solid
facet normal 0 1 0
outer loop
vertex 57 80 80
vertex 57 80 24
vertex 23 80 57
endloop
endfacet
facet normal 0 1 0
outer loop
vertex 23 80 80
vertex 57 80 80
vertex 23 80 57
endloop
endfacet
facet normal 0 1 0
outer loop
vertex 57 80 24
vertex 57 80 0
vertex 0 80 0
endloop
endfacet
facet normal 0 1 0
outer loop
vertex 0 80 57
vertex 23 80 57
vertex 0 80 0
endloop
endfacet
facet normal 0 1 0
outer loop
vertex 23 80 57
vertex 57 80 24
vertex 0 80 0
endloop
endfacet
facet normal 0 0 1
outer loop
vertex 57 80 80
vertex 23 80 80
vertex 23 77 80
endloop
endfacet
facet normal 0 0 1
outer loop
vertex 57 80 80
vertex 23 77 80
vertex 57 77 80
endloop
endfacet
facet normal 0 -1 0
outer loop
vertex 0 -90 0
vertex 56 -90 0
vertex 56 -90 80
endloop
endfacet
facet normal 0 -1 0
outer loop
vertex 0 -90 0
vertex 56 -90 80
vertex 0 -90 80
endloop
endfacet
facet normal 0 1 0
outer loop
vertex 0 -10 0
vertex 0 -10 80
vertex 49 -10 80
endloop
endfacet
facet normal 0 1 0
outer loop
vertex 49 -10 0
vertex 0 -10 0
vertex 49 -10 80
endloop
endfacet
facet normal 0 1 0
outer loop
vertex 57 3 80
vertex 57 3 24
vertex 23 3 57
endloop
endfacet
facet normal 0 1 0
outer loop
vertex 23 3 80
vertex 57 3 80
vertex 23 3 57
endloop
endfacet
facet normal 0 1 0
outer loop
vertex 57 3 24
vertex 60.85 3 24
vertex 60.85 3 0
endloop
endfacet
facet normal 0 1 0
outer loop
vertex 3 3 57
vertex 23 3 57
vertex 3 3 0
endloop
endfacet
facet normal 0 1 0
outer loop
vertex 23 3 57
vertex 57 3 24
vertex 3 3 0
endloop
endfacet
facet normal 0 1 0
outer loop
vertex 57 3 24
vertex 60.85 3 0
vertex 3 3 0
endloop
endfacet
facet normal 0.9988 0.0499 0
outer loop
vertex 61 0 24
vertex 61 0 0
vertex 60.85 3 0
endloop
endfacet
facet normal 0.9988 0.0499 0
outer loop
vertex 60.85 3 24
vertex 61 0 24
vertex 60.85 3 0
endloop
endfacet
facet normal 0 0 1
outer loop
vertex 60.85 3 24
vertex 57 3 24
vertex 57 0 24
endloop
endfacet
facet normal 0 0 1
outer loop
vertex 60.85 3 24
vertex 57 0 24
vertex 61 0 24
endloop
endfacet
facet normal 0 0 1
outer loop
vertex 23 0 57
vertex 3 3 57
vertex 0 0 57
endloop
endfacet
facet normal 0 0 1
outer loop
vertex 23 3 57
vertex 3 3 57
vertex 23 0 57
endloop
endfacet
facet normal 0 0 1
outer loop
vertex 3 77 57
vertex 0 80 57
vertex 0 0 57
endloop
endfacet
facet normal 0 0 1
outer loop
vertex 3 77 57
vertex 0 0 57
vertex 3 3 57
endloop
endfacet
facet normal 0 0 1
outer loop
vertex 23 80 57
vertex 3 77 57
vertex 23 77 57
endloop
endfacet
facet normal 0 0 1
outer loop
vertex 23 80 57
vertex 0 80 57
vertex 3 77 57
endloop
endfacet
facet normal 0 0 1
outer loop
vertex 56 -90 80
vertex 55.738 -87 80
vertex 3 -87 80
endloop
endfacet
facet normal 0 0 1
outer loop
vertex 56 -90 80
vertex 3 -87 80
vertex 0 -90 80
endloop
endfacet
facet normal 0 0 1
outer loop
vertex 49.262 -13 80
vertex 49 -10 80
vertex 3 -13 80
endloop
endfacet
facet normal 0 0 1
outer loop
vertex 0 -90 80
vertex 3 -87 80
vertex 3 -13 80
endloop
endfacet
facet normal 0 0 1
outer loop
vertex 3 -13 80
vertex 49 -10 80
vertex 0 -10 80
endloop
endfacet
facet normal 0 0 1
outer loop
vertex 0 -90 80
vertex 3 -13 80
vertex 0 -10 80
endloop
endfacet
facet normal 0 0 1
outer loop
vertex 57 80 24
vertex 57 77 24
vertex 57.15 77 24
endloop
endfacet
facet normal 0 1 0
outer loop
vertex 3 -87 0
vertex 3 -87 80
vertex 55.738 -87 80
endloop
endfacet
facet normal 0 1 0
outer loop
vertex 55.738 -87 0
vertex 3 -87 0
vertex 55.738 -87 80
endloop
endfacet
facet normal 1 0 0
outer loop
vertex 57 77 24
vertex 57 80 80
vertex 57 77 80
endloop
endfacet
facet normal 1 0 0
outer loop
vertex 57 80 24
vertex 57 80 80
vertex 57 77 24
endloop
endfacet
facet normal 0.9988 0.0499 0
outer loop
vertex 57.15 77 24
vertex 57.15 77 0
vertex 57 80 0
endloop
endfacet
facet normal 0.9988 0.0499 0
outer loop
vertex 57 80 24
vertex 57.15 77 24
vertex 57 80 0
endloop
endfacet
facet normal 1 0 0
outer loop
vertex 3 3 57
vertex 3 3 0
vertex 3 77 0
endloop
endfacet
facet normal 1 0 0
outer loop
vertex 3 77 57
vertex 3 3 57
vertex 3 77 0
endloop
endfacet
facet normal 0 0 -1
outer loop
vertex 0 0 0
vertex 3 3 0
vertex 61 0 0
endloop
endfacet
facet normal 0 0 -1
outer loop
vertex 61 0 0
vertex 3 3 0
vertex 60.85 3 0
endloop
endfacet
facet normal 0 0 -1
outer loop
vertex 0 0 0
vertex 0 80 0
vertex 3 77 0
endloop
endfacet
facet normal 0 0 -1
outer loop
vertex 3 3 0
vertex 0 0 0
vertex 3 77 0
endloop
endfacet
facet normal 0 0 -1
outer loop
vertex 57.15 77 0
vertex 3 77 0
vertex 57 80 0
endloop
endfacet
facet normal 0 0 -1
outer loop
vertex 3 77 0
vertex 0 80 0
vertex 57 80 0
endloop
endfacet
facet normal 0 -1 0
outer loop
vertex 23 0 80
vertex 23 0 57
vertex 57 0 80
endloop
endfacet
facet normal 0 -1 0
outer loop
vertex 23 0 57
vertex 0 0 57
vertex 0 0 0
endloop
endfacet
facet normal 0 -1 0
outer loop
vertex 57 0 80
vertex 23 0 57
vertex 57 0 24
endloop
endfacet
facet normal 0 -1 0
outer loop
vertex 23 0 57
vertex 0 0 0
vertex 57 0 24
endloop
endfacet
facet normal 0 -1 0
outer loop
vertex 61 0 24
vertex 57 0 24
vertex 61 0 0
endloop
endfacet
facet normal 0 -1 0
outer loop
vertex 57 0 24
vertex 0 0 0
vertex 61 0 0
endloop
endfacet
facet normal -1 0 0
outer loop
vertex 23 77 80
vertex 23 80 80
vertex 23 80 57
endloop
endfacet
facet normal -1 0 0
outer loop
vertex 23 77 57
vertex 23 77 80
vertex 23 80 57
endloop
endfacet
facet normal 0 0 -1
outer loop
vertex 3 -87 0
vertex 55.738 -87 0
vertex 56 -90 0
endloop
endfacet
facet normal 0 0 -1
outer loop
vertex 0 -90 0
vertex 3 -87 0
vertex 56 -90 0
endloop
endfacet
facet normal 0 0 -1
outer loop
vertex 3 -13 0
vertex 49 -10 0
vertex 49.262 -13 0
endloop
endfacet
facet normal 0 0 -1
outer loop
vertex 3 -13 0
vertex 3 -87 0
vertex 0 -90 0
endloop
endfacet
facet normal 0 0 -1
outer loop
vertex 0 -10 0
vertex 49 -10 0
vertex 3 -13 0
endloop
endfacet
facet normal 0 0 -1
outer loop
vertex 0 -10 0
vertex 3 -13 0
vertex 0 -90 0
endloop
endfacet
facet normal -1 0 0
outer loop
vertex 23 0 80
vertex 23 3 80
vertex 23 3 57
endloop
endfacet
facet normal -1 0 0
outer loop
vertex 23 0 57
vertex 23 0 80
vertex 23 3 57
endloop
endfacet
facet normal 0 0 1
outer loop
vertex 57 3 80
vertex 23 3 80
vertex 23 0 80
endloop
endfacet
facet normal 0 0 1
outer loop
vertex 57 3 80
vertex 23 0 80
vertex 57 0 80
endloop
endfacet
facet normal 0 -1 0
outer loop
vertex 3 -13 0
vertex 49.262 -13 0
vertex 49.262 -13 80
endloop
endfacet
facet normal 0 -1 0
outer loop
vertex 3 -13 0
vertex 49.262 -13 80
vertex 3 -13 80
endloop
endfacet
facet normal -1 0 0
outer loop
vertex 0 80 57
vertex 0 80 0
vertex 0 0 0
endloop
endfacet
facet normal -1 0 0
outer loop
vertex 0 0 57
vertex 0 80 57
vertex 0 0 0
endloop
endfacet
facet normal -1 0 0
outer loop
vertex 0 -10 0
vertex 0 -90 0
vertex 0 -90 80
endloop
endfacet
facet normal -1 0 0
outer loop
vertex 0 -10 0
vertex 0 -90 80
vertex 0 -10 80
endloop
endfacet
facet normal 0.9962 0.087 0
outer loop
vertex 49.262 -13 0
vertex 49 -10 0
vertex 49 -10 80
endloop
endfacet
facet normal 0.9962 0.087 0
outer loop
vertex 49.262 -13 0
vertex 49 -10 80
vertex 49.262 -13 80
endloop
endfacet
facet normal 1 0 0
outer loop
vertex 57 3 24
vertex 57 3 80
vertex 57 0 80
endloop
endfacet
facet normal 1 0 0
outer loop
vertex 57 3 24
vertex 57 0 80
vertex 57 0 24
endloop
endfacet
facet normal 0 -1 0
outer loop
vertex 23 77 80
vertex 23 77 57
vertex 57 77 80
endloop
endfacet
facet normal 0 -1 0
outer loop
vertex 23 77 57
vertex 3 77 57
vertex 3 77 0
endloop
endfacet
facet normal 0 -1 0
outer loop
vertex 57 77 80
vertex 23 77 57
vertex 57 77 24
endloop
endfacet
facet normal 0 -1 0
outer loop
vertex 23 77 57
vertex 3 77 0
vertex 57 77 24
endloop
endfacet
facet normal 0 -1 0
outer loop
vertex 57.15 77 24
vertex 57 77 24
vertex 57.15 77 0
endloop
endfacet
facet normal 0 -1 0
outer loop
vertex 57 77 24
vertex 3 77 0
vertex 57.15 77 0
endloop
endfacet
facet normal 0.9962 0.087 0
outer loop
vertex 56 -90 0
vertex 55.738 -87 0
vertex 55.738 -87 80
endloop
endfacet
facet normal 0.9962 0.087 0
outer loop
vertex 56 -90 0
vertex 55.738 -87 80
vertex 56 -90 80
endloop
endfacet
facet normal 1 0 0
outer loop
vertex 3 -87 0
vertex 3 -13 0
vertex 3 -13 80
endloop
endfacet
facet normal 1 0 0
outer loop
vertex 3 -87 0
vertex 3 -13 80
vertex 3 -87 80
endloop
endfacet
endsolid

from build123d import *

# Parameters (mm, degrees)
EXTRUDE_1_DEPTH     = 80
EXTRUDE_2_DEPTH     = 80
SKETCH_4_W          = 23
SKETCH_4_H          = 23
CUT_EXTRUDE_5_DEPTH = 80
SKETCH_5_W          = 4
SKETCH_5_H          = 56
CUT_EXTRUDE_7_DEPTH = 80


with BuildPart() as part:
    # 스케치1 → 보스-돌출1 (new body)
    with BuildSketch(Plane.XY):
        Polygon((0, 0), (61, 0), (60.85, 3), (3, 3), (3, 77), (57.15, 77), (57, 80), (0, 80), align=None)
    extrude(amount=EXTRUDE_1_DEPTH)

    # 스케치4 → 컷-돌출5 (cut)
    with BuildSketch(Plane(origin=(0, 80, 0), x_dir=(1, 0, 0), z_dir=(0, 1, 0))):
        with Locations((11.5, -68.5)):
            Rectangle(SKETCH_4_W, SKETCH_4_H)
    extrude(amount=-CUT_EXTRUDE_5_DEPTH, mode=Mode.SUBTRACT)

    # 스케치5 → 컷-돌출7 (cut)
    with BuildSketch(Plane(origin=(0, 80, 0), x_dir=(1, 0, 0), z_dir=(0, 1, 0))):
        with Locations((59, -52)):
            Rectangle(SKETCH_5_W, SKETCH_5_H)
    extrude(amount=-CUT_EXTRUDE_7_DEPTH, mode=Mode.SUBTRACT)


with BuildPart() as body_2:
    # 스케치1<3> → 보스-돌출2 (new body)
    with BuildSketch(Plane.XY):
        Polygon((0, -10), (49, -10), (49.2625, -13), (3, -13), (3, -87), (55.7375, -87), (56, -90), (0, -90), align=None)
    extrude(amount=EXTRUDE_2_DEPTH)


solid = Compound([part.part, body_2.part])
